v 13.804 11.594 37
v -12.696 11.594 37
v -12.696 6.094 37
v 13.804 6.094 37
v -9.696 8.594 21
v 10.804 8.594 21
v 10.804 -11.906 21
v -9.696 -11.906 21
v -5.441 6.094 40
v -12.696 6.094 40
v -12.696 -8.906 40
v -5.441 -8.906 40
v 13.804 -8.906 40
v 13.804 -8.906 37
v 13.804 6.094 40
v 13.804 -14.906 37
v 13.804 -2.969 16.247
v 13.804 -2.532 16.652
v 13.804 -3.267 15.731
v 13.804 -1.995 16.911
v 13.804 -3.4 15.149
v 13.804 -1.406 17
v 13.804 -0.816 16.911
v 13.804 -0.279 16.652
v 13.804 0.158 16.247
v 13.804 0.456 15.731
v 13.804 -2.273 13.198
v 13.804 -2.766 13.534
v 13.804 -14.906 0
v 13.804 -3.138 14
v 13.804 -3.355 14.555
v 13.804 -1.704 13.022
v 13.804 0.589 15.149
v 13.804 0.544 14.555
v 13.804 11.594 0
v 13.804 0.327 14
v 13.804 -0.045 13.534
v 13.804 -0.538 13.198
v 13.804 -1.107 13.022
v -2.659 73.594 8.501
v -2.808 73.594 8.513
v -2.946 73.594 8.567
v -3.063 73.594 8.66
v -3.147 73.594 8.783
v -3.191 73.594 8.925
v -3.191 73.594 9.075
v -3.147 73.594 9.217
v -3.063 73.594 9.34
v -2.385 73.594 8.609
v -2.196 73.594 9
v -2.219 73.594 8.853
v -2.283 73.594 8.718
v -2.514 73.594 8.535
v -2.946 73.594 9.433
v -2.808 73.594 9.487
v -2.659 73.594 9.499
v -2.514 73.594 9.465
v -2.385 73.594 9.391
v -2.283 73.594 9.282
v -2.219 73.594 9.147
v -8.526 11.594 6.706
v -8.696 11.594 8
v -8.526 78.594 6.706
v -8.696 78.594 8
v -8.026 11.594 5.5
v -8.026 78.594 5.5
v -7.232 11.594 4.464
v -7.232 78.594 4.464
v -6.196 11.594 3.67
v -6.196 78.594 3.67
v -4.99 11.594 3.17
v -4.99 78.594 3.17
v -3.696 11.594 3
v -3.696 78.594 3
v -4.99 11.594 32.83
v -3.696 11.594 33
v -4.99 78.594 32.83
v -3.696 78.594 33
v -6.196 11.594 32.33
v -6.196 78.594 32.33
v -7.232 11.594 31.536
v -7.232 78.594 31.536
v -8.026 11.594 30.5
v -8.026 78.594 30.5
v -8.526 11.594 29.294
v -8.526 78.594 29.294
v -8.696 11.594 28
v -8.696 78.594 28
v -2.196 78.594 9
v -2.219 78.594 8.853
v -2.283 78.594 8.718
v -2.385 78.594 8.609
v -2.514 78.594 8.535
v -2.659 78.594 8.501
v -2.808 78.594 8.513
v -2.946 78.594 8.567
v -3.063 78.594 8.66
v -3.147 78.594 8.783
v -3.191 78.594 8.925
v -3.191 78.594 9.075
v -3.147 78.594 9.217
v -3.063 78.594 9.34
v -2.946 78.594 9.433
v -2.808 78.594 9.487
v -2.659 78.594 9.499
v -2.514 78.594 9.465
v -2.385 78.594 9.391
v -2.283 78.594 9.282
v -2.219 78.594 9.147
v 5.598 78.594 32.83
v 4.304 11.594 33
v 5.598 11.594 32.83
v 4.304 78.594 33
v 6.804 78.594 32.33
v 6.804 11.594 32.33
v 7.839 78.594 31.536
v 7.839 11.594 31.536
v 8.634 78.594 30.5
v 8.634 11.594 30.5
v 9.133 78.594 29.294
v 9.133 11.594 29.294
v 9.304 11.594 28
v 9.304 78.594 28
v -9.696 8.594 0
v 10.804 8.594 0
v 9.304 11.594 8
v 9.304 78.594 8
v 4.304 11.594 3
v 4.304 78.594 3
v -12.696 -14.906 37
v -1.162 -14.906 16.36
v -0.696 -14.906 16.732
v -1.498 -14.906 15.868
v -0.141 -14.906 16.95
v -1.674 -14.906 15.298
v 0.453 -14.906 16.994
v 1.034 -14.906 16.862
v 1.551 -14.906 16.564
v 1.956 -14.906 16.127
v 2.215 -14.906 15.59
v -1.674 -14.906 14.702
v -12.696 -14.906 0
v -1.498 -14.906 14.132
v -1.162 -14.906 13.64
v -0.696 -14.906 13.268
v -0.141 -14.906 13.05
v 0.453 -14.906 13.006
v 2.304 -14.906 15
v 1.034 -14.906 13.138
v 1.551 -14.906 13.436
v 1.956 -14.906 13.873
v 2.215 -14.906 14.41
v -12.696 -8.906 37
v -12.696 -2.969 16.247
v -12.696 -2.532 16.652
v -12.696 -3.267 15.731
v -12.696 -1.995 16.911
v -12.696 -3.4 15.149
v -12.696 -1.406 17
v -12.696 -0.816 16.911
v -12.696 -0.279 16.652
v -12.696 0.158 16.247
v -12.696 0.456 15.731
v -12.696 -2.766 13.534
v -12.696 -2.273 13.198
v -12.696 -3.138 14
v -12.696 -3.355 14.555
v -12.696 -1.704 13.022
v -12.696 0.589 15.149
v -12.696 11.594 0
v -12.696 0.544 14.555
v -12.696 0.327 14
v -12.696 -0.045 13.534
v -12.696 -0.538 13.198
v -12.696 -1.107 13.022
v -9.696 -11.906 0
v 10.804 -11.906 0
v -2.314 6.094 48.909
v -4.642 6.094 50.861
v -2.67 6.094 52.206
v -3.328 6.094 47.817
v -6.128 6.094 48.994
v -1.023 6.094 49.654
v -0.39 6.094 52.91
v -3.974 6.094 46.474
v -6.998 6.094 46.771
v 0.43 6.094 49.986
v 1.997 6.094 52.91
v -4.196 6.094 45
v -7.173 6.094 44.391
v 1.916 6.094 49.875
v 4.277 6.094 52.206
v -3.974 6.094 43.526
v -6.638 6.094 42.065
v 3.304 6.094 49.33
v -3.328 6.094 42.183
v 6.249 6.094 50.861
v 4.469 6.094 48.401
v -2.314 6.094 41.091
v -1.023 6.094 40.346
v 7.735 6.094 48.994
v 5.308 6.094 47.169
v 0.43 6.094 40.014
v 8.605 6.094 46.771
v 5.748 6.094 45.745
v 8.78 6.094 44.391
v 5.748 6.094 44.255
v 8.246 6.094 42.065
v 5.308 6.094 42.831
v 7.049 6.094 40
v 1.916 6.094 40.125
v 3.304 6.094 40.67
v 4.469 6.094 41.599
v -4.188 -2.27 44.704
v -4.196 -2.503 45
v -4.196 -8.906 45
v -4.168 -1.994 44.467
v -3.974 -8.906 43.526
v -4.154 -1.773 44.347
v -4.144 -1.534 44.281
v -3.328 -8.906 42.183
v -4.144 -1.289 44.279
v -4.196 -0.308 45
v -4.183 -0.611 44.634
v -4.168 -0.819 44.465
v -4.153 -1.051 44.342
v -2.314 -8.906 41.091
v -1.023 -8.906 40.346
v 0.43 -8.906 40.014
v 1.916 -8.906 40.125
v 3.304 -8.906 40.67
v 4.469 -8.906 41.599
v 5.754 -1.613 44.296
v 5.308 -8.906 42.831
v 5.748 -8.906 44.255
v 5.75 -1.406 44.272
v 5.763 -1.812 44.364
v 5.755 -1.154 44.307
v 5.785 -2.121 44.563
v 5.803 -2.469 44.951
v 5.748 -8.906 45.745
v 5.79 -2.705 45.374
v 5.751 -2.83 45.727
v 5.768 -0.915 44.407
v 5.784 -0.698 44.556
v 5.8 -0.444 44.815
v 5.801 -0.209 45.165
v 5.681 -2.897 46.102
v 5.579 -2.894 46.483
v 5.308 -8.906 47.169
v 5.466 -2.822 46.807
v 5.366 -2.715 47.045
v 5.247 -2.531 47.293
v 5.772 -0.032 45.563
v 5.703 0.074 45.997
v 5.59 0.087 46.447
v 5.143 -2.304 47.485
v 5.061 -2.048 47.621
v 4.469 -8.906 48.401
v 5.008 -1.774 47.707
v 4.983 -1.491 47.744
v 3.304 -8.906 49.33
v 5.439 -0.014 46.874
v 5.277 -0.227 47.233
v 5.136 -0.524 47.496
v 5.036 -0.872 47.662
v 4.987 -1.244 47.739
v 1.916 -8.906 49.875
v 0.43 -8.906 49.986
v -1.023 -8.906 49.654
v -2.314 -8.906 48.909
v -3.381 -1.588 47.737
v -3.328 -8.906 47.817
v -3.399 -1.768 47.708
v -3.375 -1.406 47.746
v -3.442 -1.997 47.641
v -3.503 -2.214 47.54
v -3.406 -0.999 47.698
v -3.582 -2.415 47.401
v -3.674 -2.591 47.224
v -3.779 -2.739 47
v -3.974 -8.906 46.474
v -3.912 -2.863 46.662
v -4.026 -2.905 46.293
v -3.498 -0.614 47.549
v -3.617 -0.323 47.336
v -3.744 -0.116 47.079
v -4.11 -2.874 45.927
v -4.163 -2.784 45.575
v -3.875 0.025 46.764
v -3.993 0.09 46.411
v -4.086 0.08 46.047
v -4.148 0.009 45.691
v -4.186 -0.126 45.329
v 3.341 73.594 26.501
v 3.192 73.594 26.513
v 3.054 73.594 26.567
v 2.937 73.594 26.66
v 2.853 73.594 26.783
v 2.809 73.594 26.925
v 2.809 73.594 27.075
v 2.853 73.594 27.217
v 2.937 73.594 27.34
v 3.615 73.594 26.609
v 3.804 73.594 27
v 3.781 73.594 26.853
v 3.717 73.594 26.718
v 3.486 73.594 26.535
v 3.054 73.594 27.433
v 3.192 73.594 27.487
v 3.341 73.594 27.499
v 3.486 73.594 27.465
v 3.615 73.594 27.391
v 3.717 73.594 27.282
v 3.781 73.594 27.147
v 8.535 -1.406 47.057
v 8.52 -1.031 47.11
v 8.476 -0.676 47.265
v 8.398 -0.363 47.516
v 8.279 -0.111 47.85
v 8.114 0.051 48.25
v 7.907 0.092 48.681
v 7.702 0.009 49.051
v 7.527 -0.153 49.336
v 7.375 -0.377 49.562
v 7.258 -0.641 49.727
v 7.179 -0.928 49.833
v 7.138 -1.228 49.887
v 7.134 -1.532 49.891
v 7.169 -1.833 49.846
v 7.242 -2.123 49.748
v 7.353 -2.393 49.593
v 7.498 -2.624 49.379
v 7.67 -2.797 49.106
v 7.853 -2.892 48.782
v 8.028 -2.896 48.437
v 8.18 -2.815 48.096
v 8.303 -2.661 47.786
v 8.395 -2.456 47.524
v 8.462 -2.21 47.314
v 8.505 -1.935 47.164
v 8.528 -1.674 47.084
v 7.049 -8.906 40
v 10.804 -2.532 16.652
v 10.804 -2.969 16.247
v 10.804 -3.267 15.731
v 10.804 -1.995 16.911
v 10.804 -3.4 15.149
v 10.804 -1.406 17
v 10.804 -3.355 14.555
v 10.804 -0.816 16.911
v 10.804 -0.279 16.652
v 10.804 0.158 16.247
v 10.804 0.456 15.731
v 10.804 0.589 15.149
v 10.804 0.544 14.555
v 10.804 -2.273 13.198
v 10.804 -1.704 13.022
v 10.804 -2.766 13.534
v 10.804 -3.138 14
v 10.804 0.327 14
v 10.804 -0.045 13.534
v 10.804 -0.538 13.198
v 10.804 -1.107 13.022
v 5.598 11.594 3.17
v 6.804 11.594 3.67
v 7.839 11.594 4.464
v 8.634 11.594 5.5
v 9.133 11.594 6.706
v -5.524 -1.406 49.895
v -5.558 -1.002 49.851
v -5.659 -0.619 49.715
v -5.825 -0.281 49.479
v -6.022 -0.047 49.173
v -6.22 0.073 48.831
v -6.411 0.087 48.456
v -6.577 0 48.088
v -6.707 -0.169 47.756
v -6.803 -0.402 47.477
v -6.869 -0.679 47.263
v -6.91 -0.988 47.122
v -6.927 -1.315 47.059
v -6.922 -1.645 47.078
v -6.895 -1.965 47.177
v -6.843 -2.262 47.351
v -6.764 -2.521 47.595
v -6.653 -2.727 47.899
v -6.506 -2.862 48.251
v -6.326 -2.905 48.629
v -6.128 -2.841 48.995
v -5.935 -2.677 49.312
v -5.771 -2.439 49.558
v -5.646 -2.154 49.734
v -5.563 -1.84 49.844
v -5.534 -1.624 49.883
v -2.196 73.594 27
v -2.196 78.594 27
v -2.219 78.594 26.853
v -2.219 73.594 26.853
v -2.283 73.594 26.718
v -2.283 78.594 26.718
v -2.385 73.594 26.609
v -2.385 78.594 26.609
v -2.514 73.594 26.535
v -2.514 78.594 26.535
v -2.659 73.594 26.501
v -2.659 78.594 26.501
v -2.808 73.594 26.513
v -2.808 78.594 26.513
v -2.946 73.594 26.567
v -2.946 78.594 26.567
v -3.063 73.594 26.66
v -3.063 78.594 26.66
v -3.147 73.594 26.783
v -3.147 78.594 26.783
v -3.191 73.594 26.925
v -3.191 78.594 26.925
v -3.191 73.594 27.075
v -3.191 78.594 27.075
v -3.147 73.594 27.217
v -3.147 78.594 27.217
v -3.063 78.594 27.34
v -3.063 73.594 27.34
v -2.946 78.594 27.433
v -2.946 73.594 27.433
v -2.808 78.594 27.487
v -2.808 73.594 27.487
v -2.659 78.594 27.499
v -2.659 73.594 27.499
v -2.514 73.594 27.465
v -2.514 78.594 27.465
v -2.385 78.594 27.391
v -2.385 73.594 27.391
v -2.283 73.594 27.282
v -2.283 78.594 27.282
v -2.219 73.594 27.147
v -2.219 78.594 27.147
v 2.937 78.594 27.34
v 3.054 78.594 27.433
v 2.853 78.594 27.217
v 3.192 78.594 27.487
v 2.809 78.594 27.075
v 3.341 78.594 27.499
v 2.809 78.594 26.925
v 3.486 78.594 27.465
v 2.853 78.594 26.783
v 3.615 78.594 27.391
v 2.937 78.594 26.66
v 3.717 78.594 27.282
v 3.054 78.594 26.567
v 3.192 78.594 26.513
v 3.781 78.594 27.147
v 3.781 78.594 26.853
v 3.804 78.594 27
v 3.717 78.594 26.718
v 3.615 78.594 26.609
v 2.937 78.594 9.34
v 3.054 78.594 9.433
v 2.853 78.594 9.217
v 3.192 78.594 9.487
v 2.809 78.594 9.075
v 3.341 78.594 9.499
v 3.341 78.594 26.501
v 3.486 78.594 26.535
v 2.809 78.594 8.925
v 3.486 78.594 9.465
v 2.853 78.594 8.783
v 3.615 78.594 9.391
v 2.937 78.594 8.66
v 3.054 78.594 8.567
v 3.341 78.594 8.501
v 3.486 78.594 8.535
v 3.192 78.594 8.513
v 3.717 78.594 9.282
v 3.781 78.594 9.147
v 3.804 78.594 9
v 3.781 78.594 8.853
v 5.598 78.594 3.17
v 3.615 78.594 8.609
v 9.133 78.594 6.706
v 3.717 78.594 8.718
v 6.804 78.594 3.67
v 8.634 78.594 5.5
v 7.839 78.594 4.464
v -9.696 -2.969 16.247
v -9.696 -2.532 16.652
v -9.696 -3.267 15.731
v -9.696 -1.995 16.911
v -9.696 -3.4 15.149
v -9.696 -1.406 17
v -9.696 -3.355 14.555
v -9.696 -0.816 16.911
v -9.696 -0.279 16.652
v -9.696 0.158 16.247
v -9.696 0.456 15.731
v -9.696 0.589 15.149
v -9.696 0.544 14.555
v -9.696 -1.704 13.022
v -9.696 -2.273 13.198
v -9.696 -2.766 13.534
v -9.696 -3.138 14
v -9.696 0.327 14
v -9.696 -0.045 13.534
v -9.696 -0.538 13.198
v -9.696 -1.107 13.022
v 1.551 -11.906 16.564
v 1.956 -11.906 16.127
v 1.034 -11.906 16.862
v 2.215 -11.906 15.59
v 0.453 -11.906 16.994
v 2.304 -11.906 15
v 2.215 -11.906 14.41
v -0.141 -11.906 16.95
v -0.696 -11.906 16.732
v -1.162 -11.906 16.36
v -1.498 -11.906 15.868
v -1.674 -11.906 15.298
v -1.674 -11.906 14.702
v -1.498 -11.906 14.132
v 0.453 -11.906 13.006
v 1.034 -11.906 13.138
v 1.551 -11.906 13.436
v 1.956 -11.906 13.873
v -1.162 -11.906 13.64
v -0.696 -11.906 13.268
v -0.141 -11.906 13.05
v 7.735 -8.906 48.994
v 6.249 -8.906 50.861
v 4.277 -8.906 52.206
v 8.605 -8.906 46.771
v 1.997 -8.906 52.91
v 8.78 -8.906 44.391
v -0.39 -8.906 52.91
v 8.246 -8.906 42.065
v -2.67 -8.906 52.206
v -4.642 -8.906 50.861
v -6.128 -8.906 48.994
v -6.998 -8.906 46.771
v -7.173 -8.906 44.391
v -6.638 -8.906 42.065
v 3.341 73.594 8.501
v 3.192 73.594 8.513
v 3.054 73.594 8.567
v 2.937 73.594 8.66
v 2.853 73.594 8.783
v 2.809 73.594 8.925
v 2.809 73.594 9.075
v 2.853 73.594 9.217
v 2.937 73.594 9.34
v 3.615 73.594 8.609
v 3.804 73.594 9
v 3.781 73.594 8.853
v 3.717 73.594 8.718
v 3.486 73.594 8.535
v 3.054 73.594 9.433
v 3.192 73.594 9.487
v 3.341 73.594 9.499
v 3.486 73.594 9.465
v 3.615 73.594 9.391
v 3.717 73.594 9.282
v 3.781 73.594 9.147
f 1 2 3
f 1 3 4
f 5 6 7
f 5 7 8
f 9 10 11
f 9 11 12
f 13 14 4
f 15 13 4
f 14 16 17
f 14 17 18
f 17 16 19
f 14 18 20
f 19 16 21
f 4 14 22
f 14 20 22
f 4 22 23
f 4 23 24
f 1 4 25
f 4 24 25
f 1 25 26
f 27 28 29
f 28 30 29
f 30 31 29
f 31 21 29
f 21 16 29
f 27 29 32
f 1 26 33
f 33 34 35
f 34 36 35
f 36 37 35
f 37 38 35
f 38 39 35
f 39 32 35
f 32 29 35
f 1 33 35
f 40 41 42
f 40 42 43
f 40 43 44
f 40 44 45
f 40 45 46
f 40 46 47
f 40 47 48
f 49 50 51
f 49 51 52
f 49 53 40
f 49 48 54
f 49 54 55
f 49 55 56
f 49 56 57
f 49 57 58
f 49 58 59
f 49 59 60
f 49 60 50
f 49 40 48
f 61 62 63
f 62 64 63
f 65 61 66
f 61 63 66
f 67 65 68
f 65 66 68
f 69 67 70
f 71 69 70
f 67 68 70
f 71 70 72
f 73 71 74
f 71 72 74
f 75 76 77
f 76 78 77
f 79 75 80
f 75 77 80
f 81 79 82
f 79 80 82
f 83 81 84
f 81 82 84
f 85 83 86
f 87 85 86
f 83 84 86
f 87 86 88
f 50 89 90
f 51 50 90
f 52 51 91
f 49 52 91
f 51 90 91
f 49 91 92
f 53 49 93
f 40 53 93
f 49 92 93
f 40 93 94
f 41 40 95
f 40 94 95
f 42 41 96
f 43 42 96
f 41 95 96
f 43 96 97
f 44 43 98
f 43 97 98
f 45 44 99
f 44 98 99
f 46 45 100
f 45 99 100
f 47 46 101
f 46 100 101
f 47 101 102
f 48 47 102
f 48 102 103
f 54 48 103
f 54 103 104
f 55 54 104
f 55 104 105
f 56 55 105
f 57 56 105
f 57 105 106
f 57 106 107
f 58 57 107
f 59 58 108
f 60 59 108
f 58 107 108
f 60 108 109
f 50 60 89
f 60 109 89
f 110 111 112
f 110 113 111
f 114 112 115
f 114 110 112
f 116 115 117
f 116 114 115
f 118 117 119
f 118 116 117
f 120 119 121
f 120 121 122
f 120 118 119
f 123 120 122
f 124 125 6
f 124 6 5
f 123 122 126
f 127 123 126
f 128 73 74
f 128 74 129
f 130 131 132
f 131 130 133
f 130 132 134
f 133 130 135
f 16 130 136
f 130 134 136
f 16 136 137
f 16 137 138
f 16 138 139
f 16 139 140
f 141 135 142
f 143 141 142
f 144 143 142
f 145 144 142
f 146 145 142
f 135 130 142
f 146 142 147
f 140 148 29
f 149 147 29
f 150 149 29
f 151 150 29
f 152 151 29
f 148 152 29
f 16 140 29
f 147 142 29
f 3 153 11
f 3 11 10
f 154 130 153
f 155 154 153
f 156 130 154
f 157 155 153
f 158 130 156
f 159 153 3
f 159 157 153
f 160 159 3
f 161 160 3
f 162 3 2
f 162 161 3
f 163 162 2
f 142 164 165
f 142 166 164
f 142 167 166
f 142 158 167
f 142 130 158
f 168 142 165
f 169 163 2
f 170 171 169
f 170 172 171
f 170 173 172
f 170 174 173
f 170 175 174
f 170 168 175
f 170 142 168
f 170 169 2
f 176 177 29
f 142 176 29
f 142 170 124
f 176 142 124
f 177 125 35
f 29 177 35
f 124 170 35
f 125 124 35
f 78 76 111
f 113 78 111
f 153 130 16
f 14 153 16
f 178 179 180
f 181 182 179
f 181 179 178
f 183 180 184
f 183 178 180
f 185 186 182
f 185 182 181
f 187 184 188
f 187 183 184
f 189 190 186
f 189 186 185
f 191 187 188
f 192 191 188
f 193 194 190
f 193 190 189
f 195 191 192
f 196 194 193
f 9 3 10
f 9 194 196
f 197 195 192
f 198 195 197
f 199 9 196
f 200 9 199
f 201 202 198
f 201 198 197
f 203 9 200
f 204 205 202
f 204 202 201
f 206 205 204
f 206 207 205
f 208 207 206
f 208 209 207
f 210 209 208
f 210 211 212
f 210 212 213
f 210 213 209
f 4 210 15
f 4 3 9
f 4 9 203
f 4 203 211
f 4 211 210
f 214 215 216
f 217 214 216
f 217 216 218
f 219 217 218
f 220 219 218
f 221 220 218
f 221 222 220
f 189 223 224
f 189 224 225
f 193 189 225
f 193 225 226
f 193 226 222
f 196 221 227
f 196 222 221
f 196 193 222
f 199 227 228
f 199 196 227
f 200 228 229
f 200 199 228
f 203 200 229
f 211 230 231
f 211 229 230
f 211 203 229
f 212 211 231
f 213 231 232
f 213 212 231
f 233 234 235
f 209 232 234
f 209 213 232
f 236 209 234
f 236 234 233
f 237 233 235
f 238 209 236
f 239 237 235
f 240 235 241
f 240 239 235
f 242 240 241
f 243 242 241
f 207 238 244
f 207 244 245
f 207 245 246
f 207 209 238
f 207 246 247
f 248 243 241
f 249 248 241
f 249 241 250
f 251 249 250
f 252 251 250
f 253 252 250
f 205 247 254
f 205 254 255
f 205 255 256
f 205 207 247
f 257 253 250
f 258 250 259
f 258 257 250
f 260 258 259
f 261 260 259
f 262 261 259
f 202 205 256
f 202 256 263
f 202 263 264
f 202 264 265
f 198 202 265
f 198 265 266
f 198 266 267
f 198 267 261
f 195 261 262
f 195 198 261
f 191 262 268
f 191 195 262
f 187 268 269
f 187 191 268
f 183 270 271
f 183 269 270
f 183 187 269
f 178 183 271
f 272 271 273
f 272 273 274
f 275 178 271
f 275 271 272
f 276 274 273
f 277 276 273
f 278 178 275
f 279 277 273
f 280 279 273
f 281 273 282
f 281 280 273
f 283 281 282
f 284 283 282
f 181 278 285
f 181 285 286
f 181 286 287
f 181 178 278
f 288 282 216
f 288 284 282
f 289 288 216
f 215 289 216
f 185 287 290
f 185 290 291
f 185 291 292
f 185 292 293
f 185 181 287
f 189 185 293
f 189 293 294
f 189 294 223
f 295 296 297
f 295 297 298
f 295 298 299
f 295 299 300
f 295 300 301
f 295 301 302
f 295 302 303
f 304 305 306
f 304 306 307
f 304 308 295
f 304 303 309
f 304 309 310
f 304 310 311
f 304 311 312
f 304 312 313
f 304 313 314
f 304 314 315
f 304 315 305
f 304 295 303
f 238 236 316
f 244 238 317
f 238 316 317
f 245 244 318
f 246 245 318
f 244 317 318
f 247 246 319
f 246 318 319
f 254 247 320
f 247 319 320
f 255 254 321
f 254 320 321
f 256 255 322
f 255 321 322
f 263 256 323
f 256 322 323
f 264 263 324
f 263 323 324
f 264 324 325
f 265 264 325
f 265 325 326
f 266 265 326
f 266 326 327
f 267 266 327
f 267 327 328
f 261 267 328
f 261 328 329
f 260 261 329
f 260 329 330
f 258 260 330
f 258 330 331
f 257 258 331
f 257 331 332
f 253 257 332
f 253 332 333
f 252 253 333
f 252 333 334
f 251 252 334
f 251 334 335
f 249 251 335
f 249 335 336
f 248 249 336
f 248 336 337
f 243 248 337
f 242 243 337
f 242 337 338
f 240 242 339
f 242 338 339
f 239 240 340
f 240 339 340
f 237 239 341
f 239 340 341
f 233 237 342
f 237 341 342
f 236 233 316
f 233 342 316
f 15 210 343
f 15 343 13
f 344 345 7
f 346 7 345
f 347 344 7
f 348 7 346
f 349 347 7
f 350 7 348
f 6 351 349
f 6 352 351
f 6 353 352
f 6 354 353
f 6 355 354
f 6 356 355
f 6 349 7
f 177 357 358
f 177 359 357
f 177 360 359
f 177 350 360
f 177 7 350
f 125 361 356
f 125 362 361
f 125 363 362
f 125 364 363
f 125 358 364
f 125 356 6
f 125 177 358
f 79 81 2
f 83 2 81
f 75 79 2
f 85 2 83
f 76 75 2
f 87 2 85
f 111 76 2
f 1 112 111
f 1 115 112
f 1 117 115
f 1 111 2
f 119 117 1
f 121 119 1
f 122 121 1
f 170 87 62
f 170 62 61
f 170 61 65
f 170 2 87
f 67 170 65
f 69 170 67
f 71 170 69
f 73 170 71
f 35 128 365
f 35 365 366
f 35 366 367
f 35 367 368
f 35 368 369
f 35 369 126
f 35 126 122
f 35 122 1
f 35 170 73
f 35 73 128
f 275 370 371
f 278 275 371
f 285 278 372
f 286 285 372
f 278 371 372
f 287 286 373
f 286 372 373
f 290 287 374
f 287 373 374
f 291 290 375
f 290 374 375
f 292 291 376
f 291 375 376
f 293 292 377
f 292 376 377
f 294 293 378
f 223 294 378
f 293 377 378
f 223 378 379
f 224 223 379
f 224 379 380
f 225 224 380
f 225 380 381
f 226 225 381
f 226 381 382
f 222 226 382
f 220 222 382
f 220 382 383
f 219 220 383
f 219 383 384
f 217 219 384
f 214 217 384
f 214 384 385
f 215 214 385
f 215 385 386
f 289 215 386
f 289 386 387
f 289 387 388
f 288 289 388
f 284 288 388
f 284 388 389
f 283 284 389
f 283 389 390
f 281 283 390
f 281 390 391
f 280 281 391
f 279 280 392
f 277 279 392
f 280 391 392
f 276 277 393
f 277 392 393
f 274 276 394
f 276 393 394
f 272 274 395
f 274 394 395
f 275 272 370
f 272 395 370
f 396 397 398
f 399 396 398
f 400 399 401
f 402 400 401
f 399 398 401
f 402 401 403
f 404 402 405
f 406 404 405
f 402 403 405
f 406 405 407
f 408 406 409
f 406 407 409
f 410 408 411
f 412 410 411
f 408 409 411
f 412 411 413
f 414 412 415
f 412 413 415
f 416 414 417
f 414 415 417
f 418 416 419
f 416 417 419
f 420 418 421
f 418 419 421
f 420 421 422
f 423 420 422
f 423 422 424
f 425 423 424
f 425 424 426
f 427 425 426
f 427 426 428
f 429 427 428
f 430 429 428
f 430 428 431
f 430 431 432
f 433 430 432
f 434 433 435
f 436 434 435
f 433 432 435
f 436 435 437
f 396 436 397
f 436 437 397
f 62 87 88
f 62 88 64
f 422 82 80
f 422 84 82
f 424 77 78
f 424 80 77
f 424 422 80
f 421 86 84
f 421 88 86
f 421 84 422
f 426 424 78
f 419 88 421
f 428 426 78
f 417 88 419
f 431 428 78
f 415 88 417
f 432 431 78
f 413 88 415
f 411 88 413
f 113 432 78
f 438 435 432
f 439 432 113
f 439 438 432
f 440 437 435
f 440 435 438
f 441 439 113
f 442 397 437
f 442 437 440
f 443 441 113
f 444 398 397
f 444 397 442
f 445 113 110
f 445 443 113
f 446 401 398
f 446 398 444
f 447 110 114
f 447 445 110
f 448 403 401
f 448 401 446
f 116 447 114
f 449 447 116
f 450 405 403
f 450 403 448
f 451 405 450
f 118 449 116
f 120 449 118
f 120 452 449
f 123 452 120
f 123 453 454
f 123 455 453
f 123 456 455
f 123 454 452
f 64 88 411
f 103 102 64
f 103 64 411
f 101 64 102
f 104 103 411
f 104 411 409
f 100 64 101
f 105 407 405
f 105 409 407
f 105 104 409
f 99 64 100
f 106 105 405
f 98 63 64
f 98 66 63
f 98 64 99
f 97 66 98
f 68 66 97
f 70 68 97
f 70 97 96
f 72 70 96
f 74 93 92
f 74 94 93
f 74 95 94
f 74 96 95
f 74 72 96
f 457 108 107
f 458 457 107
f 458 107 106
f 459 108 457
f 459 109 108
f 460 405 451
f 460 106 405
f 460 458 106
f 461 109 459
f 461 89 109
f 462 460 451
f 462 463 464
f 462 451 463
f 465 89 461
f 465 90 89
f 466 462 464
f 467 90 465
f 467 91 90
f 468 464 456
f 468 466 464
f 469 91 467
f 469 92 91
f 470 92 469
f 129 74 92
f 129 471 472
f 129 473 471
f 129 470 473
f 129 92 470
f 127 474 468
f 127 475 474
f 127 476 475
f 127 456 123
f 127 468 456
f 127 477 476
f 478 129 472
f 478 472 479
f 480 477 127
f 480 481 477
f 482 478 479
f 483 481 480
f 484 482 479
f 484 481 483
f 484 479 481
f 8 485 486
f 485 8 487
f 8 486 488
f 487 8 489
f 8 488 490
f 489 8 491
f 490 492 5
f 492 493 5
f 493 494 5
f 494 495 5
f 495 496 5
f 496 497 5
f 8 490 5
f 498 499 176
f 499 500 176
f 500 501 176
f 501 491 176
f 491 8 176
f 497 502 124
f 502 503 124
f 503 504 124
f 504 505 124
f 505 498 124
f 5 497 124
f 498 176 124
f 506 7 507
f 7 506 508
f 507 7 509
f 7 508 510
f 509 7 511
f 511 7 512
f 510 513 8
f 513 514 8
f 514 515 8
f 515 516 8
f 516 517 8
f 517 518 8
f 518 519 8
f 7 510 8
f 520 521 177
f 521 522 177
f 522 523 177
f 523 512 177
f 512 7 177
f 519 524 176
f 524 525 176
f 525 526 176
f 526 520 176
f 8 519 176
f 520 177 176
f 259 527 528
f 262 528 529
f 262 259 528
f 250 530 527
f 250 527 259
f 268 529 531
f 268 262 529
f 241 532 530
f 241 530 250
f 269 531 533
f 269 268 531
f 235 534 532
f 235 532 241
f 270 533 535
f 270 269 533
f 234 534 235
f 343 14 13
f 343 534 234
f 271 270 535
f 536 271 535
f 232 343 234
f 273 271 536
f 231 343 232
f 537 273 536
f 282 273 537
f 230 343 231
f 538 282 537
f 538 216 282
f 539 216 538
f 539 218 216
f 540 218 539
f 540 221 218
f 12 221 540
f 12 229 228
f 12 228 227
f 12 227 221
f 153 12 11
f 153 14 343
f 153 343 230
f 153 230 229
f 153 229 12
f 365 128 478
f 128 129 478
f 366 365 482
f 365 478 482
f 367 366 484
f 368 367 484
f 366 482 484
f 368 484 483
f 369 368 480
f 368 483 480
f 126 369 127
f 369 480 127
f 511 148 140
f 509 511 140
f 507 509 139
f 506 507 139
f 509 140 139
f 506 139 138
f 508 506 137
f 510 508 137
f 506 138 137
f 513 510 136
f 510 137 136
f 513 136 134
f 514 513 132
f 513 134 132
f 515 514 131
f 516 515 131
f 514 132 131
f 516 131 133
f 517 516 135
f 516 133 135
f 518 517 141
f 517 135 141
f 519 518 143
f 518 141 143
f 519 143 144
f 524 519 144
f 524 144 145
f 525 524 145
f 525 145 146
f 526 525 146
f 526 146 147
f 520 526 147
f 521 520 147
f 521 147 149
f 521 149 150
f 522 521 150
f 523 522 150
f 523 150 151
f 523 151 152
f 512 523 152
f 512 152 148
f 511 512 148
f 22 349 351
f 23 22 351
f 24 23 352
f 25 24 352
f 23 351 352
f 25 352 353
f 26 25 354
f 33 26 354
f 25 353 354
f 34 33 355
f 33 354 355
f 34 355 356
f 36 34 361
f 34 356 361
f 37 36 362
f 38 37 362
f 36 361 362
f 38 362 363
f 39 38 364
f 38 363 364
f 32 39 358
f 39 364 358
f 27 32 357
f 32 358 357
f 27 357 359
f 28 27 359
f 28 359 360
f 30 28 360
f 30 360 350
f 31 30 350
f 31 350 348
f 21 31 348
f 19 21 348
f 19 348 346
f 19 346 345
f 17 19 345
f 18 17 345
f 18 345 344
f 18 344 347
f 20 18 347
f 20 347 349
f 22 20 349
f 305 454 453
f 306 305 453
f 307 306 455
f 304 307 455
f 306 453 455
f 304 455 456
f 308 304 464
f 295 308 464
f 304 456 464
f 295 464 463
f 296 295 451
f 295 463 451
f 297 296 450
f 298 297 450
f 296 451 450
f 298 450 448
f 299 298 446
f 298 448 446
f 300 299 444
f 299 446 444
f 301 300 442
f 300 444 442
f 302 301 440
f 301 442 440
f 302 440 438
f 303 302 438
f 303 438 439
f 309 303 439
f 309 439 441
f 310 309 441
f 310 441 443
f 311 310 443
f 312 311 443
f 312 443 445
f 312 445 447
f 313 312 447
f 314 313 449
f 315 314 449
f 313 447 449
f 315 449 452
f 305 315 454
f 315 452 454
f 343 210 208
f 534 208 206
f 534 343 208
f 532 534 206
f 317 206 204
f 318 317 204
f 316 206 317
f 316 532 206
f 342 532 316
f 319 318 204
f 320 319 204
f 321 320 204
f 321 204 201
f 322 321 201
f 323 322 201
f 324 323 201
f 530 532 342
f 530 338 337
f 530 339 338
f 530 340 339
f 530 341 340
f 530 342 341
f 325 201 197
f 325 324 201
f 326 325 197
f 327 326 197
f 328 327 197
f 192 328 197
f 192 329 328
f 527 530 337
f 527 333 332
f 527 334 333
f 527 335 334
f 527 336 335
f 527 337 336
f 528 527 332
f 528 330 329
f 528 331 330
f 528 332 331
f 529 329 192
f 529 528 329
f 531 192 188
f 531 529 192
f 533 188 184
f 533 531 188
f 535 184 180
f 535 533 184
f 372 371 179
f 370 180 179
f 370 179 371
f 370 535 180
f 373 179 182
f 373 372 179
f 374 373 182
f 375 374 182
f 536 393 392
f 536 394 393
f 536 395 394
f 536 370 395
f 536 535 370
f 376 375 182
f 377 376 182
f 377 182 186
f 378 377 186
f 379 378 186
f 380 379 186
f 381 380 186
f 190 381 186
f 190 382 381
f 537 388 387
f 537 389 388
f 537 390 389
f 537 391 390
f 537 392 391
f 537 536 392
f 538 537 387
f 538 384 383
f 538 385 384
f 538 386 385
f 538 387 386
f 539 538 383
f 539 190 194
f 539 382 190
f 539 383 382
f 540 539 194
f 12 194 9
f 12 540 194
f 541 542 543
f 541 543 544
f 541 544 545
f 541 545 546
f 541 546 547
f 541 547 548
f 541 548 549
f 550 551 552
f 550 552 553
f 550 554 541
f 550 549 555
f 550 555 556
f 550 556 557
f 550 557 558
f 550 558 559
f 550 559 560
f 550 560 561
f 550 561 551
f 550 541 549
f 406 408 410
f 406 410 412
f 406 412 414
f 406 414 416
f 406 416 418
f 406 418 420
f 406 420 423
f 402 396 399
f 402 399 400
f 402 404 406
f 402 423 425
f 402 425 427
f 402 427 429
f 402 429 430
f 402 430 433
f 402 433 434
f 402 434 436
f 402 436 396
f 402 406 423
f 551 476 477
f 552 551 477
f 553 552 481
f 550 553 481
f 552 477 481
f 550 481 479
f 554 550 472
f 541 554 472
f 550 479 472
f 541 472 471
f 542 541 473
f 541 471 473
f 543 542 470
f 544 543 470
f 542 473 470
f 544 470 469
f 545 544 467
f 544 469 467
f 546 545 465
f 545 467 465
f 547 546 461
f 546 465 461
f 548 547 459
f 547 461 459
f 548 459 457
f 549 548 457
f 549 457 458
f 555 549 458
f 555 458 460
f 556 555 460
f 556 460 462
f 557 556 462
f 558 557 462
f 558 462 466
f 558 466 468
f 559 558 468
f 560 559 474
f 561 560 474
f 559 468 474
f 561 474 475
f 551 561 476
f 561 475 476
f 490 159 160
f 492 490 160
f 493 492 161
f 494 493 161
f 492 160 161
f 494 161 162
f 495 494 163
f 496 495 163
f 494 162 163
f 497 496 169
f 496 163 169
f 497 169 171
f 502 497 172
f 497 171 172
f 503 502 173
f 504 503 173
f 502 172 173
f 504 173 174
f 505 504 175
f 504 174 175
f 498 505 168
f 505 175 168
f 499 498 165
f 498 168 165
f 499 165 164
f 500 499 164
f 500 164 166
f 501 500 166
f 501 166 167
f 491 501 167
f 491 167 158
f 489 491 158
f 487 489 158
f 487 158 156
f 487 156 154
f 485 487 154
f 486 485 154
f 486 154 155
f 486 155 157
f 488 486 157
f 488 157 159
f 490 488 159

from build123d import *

# Parameters (mm, degrees)
ESQUISSE1_W                   = 26.5
ESQUISSE1_H                   = 26.5
BOSS_EXTRU_1_DEPTH            = 40
ESQUISSE2_W                   = 20.5
ESQUISSE2_H                   = 20.5
ENL_V_MAT_EXTRU_1_DEPTH       = 21
ESQUISSE4_R                   = 8
ESQUISSE4_R_2                 = 5
BOSS_EXTRU_3_DEPTH            = 7.5
ESQUISSE4_4_R                 = 8
ESQUISSE4_4_R_2               = 5
BOSS_EXTRU_4_DEPTH            = 7.5
ESQUISSE8_W                   = 26.5
ESQUISSE8_H                   = 3
ENL_V_MAT_EXTRU_4_DEPTH       = 6
ESQUISSE12_W                  = 18
ESQUISSE12_H                  = 30
BOSS_EXTRU_5_DEPTH            = 67
CONG_1_R                      = 5
CONG_2_R                      = 5
CONG_3_R                      = 5
CONG_4_R                      = 5
ENL_V_MAT_EXTRU_7_REACH       = 51.366
ESQUISSE17_R                  = 1.5
ENL_V_MAT_EXTRU_8_REACH       = 51.012
ESQUISSE18_R                  = 1.5
ESQUISSE13_R                  = 0.5
ENL_V_MAT_EXTRU_9_DEPTH       = 5
ESQUISSE19_R                  = 2
ENL_V_MAT_EXTRU_10_DEPTH      = 1
ENL_V_MAT_EXTRU_10_DEPTH_BACK = 27.5
ENL_V_MAT_EXTRU_11_REACH      = 95.5
ESQUISSE20_R                  = 2
ESQUISSE9_W                   = 26.5
ESQUISSE9_H                   = 3
ENL_V_MAT_EXTRU_13_DEPTH      = 5.5


with BuildPart() as part:
    # Esquisse1 → Boss.-Extru.1 (new body)
    with BuildSketch(Plane.XY):
        with Locations((0.553632827, -1.655537459)):
            Rectangle(ESQUISSE1_W, ESQUISSE1_H)
    extrude(amount=BOSS_EXTRU_1_DEPTH)

    # Esquisse2 → Enlèv. mat.-Extru.1 (cut)
    with BuildSketch(Plane(origin=(0, 0, 0), x_dir=(-1, 0, 0), z_dir=(0, 0, -1))):
        with Locations((-0.553632827, -1.655537459)):
            Rectangle(ESQUISSE2_W, ESQUISSE2_H)
    extrude(amount=-ENL_V_MAT_EXTRU_1_DEPTH, mode=Mode.SUBTRACT)

    # Esquisse4 → Boss.-Extru.3 (add)
    with BuildSketch(Plane(origin=(0, -1.405537459, 0), x_dir=(-1, 0, 0), z_dir=(0, -1, 0))):
        with Locations((-0.803632827, -45)):
            Circle(ESQUISSE4_R)
        with Locations((-0.803632827, -45)):
            Circle(ESQUISSE4_R_2, mode=Mode.SUBTRACT)
    extrude(amount=BOSS_EXTRU_3_DEPTH)

    # Esquisse4<4> → Boss.-Extru.4 (add)
    with BuildSketch(Plane(origin=(0, -1.405537459, 0), x_dir=(-1, 0, 0), z_dir=(0, -1, 0))):
        with Locations((-0.803632827, -45)):
            Circle(ESQUISSE4_4_R)
        with Locations((-0.803632827, -45)):
            Circle(ESQUISSE4_4_R_2, mode=Mode.SUBTRACT)
    extrude(amount=-BOSS_EXTRU_4_DEPTH)

    # Esquisse8 → Enlèv. mat.-Extru.4 (cut)
    with BuildSketch(Plane.XZ.offset(14.905537459)):
        with Locations((0.553632827, 38.5)):
            Rectangle(ESQUISSE8_W, ESQUISSE8_H)
    extrude(amount=-ENL_V_MAT_EXTRU_4_DEPTH, mode=Mode.SUBTRACT)

    # Esquisse12 → Boss.-Extru.5 (add)
    with BuildSketch(Plane(origin=(0, 11.594462541, 0), x_dir=(1, 0, 0), z_dir=(0, 1, 0))):
        with Locations((0.303632827, -18)):
            Rectangle(ESQUISSE12_W, ESQUISSE12_H)
    extrude(amount=BOSS_EXTRU_5_DEPTH)

    # Congé1
    cong_1_edges = [part.edges().sort_by_distance(p)[0] for p in [
        (9.303632827, 45.094462541, 33),
    ]]
    fillet(cong_1_edges, radius=CONG_1_R)

    # Congé2
    cong_2_edges = [part.edges().sort_by_distance(p)[0] for p in [
        (-8.696367173, 45.094462541, 33),
    ]]
    fillet(cong_2_edges, radius=CONG_2_R)

    # Congé3
    cong_3_edges = [part.edges().sort_by_distance(p)[0] for p in [
        (-8.696367173, 45.094462541, 3),
    ]]
    fillet(cong_3_edges, radius=CONG_3_R)

    # Congé4
    cong_4_edges = [part.edges().sort_by_distance(p)[0] for p in [
        (9.303632827, 45.094462541, 3),
    ]]
    fillet(cong_4_edges, radius=CONG_4_R)

    # Esquisse17 → Enlèv. mat.-Extru.7 (cut, up to next)
    with BuildSketch(Plane(origin=(28.558670663, 0, 28.558670663), x_dir=(0.707106781, 0, -0.707106781), z_dir=(0.707106781, 0, 0.707106781)), mode=Mode.PRIVATE) as enl_v_mat_extru_7_sk1:
        with Locations((-28.738974236, -1.405537459)):
            Circle(ESQUISSE17_R)
    enl_v_mat_extru_7_tool1 = extrude(enl_v_mat_extru_7_sk1.sketch, amount=-ENL_V_MAT_EXTRU_7_REACH, mode=Mode.PRIVATE) & part.part
    add(enl_v_mat_extru_7_tool1.solids().sort_by_distance((8.237147, -1.405537, 48.880194))[0], mode=Mode.SUBTRACT)

    # Esquisse18 → Enlèv. mat.-Extru.8 (cut, up to next)
    with BuildSketch(Plane(origin=(-27.755037836, 0, 27.755037836), x_dir=(0.707106781, 0, 0.707106781), z_dir=(-0.707106781, 0, 0.707106781)), mode=Mode.PRIVATE) as enl_v_mat_extru_8_sk1:
        with Locations((29.875394998, -1.405537459)):
            Circle(ESQUISSE18_R)
    enl_v_mat_extru_8_tool1 = extrude(enl_v_mat_extru_8_sk1.sketch, amount=-ENL_V_MAT_EXTRU_8_REACH, mode=Mode.PRIVATE) & part.part
    add(enl_v_mat_extru_8_tool1.solids().sort_by_distance((-6.629943, -1.405537, 48.880132))[0], mode=Mode.SUBTRACT)

    # Esquisse13 → Enlèv. mat.-Extru.9 (cut)
    with BuildSketch(Plane(origin=(0, 78.594462541, 0), x_dir=(1, 0, 0), z_dir=(0, 1, 0))):
        with Locations((3.303632827, -9)):
            Circle(ESQUISSE13_R)
        with Locations((-2.696367173, -9)):
            Circle(ESQUISSE13_R)
        with Locations((3.303632827, -27)):
            Circle(ESQUISSE13_R)
        with Locations((-2.696367173, -27)):
            Circle(ESQUISSE13_R)
    extrude(amount=-ENL_V_MAT_EXTRU_9_DEPTH, mode=Mode.SUBTRACT)

    # Esquisse19 → Enlèv. mat.-Extru.10 (cut, two sides)
    with BuildSketch(Plane.ZY.offset(12.696367173)) as enl_v_mat_extru_10_sk:
        with Locations((15, -1.405537459)):
            Circle(ESQUISSE19_R)
    extrude(amount=ENL_V_MAT_EXTRU_10_DEPTH, mode=Mode.SUBTRACT)
    extrude(enl_v_mat_extru_10_sk.sketch, amount=-ENL_V_MAT_EXTRU_10_DEPTH_BACK, mode=Mode.SUBTRACT)

    # Esquisse20 → Enlèv. mat.-Extru.11 (cut, up to next)
    with BuildSketch(Plane.XZ.offset(14.905537459), mode=Mode.PRIVATE) as enl_v_mat_extru_11_sk1:
        with Locations((0.303632827, 15)):
            Circle(ESQUISSE20_R)
    enl_v_mat_extru_11_tool1 = extrude(enl_v_mat_extru_11_sk1.sketch, amount=-ENL_V_MAT_EXTRU_11_REACH, mode=Mode.PRIVATE) & part.part
    add(enl_v_mat_extru_11_tool1.solids().sort_by_distance((0.303633, -14.905537, 15))[0], mode=Mode.SUBTRACT)

    # Esquisse9 → Enlèv. mat.-Extru.13 (cut)
    with BuildSketch(Plane(origin=(0, 11.594462541, 0), x_dir=(1, 0, 0), z_dir=(0, 1, 0))):
        with Locations((0.553632827, -38.5)):
            Rectangle(ESQUISSE9_W, ESQUISSE9_H)
    extrude(amount=-ENL_V_MAT_EXTRU_13_DEPTH, mode=Mode.SUBTRACT)


solid = part.part
